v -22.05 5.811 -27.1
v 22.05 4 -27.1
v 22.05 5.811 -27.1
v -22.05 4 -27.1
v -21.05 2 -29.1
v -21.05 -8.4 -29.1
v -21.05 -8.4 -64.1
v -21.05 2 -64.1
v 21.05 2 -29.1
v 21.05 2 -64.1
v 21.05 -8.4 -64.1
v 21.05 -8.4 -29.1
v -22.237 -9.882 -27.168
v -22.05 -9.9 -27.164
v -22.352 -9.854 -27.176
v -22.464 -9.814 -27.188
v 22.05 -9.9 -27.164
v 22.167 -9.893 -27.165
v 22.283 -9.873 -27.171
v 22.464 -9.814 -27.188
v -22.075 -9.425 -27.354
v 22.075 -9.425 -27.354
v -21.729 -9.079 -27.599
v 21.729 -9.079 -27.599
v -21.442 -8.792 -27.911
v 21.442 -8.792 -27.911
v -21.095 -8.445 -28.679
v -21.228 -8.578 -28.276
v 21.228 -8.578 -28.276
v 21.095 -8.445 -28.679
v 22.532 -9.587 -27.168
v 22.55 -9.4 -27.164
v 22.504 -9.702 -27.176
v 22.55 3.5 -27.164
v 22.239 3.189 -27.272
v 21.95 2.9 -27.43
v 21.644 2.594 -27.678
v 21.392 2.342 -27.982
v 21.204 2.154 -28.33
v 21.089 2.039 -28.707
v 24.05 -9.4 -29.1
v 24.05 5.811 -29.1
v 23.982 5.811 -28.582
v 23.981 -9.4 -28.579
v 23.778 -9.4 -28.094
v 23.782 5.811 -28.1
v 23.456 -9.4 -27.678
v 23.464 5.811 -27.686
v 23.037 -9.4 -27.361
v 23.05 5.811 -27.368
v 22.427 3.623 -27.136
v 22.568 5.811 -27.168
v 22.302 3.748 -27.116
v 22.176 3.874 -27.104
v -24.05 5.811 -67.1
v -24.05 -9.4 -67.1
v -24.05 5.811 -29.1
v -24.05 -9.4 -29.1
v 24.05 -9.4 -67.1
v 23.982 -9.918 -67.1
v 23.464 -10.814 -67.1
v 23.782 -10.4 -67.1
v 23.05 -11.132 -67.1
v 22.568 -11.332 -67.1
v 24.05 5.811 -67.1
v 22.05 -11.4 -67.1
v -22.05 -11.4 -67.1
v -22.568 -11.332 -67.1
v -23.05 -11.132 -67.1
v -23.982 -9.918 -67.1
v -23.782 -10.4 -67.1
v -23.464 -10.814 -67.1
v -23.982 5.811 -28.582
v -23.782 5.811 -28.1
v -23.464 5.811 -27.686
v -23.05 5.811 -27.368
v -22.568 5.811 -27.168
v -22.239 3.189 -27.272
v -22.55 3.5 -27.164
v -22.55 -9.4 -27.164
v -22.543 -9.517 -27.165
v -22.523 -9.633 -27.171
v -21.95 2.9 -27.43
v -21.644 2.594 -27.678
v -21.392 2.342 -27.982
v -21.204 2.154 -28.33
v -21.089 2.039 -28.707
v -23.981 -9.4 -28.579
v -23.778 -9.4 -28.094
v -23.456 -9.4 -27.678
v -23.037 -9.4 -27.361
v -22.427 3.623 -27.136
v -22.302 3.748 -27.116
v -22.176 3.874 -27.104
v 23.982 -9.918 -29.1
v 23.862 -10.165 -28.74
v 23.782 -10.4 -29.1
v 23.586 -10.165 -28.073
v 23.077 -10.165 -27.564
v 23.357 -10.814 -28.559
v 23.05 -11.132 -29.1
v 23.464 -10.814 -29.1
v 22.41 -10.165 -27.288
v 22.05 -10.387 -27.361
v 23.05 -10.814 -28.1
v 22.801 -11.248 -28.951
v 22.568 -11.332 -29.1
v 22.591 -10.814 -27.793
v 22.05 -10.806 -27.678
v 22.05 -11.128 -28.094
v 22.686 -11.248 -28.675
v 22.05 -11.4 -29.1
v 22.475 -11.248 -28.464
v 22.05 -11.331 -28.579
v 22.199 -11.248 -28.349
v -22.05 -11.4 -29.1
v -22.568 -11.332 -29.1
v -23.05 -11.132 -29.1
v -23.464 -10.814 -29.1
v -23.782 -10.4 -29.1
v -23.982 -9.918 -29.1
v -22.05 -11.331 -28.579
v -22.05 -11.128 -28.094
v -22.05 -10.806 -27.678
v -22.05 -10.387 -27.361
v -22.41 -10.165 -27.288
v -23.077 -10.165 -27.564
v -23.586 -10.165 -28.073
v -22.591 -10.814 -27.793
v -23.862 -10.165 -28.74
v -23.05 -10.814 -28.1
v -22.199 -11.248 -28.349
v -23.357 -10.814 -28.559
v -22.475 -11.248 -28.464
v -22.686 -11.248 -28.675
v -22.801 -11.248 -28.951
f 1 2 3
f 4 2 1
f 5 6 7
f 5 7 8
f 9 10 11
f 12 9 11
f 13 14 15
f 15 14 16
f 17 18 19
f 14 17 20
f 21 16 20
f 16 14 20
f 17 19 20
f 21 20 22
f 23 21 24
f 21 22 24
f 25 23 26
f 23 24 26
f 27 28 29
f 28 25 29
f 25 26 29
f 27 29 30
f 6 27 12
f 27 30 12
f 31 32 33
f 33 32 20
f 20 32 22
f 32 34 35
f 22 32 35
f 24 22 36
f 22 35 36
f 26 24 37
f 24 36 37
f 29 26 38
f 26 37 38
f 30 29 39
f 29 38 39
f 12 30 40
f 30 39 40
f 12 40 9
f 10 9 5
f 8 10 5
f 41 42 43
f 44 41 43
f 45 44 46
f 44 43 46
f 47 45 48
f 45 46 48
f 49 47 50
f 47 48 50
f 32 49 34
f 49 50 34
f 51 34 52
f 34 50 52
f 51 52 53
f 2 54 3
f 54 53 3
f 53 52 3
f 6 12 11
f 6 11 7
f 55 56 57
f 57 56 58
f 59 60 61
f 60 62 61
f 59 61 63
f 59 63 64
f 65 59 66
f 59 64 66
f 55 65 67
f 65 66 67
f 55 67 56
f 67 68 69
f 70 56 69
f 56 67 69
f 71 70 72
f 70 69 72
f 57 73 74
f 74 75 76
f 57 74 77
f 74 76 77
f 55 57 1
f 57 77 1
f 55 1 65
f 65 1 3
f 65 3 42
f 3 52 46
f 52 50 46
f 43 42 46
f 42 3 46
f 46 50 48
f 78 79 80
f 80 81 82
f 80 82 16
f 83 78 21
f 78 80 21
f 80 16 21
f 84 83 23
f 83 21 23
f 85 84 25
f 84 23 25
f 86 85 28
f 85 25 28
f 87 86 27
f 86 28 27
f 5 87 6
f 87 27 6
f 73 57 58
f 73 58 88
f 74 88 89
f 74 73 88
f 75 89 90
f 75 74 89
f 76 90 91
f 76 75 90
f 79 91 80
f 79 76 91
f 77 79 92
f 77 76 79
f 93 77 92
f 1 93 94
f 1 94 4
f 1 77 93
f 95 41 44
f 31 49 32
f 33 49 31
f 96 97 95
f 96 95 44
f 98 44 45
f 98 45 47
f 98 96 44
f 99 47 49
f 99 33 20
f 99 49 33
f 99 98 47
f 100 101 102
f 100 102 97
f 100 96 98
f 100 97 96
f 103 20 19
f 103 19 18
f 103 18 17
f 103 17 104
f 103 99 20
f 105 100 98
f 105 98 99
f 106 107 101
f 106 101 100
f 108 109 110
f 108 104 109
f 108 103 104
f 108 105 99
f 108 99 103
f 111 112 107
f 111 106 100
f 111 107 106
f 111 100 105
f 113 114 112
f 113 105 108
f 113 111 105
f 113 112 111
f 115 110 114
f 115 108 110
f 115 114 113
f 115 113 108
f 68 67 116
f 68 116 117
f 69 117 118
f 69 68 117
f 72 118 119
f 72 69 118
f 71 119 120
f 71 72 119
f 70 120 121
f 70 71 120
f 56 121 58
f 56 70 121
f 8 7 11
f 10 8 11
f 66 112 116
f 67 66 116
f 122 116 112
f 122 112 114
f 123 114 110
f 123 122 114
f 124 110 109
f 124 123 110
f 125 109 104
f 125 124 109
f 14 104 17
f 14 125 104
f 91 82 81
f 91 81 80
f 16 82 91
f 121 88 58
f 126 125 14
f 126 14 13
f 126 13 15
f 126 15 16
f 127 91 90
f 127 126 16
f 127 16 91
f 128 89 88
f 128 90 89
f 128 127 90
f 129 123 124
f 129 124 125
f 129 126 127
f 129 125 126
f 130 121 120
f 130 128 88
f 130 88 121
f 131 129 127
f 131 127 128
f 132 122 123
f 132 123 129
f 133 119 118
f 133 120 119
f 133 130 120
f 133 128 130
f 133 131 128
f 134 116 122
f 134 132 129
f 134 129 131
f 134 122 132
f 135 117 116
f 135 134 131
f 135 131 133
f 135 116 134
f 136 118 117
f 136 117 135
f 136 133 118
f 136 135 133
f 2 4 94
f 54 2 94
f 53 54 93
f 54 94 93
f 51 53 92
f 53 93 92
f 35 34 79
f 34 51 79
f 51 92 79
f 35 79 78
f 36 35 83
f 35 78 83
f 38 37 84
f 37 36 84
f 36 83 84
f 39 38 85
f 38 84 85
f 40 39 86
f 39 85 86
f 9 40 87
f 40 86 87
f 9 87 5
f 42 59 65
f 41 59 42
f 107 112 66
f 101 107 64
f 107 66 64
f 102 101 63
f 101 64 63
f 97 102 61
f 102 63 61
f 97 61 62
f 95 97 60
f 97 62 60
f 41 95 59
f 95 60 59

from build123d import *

# Parameters (mm, degrees)
F1_DEPTH      = 6.4
F2_R          = 6.4
F3_DEPTH      = 0.5
F5_DEPTH      = 35
F5_DEPTH_BACK = 5
F6_T          = -3
F7_W          = 48.1
F7_H          = 40
F8_DEPTH      = 10
F9_T1_DEPTH   = 22.4
F9_T3_DEPTH   = 44.1
F9_T5_DEPTH   = 10.4
F9_T7_DEPTH   = 42.1
F9_T9_DEPTH   = 43
F9_S13_W      = 2
F9_S13_H      = 2
F9_T14_DEPTH  = 2
F9_S19_W      = 2
F9_S19_H      = 2
F9_T20_DEPTH  = 2
F9_S25_W      = 2
F9_S25_H      = 2
F9_T26_DEPTH  = 2
F9_S31_W      = 2
F9_S31_H      = 2
F9_T32_DEPTH  = 2
F9_T39_DEPTH  = 15.4
F9_T43_DEPTH  = 47.1
F9_T50_DEPTH  = 15.4
F9_T54_DEPTH  = 47.1
F9_T61_DEPTH  = 47.1
F9_T65_DEPTH  = 15.4
F9_T72_DEPTH  = 15.4
F9_T76_DEPTH  = 47.1
F11_W         = 65.6272098422
F11_H         = 14.6678336896
F12_DEPTH     = 40.001


# Not quite as in the source:
# - a fillet or chamfer that OpenCascade refuses, or shapes differently, is made with other operations: its cross-section is extruded or revolved along the edge and cut away or added


with BuildPart() as f1:
    # F0 (on Front) → F1 (new body)
    with BuildSketch(Plane.XZ):
        with BuildLine():
            ThreePointArc((19.05, 57.1), (17.5855339059, 60.6355339059), (14.05, 62.1))
            Line((14.05, 62.1), (-14.05, 62.1))
            ThreePointArc((-14.05, 62.1), (-17.5855339059, 60.6355339059), (-19.05, 57.1))
            Line((-19.05, 57.1), (-19.05, -57.1))
            ThreePointArc((-19.05, -57.1), (-17.5855339059, -60.6355339059), (-14.05, -62.1))
            Line((-14.05, -62.1), (14.05, -62.1))
            ThreePointArc((14.05, -62.1), (17.5855339059, -60.6355339059), (19.05, -57.1))
            Line((19.05, -57.1), (19.05, 57.1))
        make_face()
    extrude(amount=F1_DEPTH)

    # F2 (on face) → F3 (join)
    with BuildSketch(Plane.XZ.offset(6.4)):
        with BuildLine():
            ThreePointArc((1.6, 0), (8, -6.4), (14.4, 0))
            ThreePointArc((14.4, 0), (8, 6.4), (1.6, 0))
        make_face()
        with BuildLine():
            Line((14.4, -16.1), (14.4, 0))
            ThreePointArc((14.4, 0), (8, -6.4), (1.6, 0))
            Line((1.6, 0), (1.6, -16.1))
            ThreePointArc((1.6, -16.1), (8, -9.7), (14.4, -16.1))
        make_face()
        with BuildLine():
            ThreePointArc((1.6, -16.1), (8, -22.5), (14.4, -16.1))
            ThreePointArc((14.4, -16.1), (8, -9.7), (1.6, -16.1))
        make_face()
        with Locations((8, 16.1)):
            Circle(F2_R)
        with Locations((-8, 16.1)):
            Circle(F2_R)
        with Locations((-8, 0)):
            Circle(F2_R)
        with Locations((-8, -16.1)):
            Circle(F2_R)
    extrude(amount=F3_DEPTH)


with BuildPart() as f5:
    # F4 (on face) → F5 (new body, two sides)
    with BuildSketch(Plane(origin=(0, 0, -62.1), x_dir=(1, 0, 0), z_dir=(0, 0, -1))) as f5_sk:
        Polygon((-14.05, 11.4), (-24.05, 11.4), (-24.05, -5), (-14.05, -5), (14.05, -5), (24.05, -5), (24.05, 11.4), (14.05, 11.4), align=None)
    extrude(amount=-F5_DEPTH)
    extrude(f5_sk.sketch, amount=F5_DEPTH_BACK)

    # F6
    f6_openings = [f5.faces().sort_by_distance(p)[0] for p in [
        (0, -3.2, -27.1),
    ]]
    offset(amount=F6_T, openings=f6_openings)

    # F7 (on face) → F8 (join)
    with BuildSketch(Plane(origin=(0, 5, 0), x_dir=(-1, 0, 0), z_dir=(0, 1, 0))):
        with Locations((0, -47.1)):
            Rectangle(F7_W, F7_H)
    extrude(amount=F8_DEPTH)

    # F9: fillet of radius 2 on 12 edges, made by hand

    # F9_s2 → F9_t1 (cut)
    with BuildSketch(Plane.XZ.offset(-13)):
        with BuildLine():
            ThreePointArc((-24.05, -29.1), (-23.4642135624, -27.6857864376), (-22.05, -27.1))
            Line((-22.05, -27.1), (-24.05, -27.1))
            Line((-24.05, -27.1), (-24.05, -29.1))
        make_face()
        with BuildLine():
            ThreePointArc((24.05, -29.1), (23.4642135624, -27.6857864376), (22.05, -27.1))
            Line((22.05, -27.1), (24.05, -27.1))
            Line((24.05, -27.1), (24.05, -29.1))
        make_face()
    extrude(amount=F9_T1_DEPTH, mode=Mode.SUBTRACT)

    # F9_s4 → F9_t3 (cut)
    with BuildSketch(Plane.YZ.offset(-22.05)):
        with BuildLine():
            ThreePointArc((15, -29.1), (14.4142135624, -27.6857864376), (13, -27.1))
            Line((13, -27.1), (15, -27.1))
            Line((15, -27.1), (15, -29.1))
        make_face()
        with BuildLine():
            ThreePointArc((-11.4, -29.1), (-10.8142135624, -27.6857864376), (-9.4, -27.1))
            Line((-9.4, -27.1), (-11.4, -27.1))
            Line((-11.4, -27.1), (-11.4, -29.1))
        make_face()
    extrude(amount=F9_T3_DEPTH, mode=Mode.SUBTRACT)

    # F9_s6 → F9_t5 (cut)
    with BuildSketch(Plane.XZ.offset(-2)):
        with BuildLine():
            ThreePointArc((-23.05, -27.1), (-21.6357864376, -27.6857864376), (-21.05, -29.1))
            Line((-21.05, -29.1), (-21.05, -27.1))
            Line((-21.05, -27.1), (-23.05, -27.1))
        make_face()
        with BuildLine():
            ThreePointArc((23.05, -27.1), (21.6357864376, -27.6857864376), (21.05, -29.1))
            Line((21.05, -29.1), (21.05, -27.1))
            Line((21.05, -27.1), (23.05, -27.1))
        make_face()
    extrude(amount=F9_T5_DEPTH, mode=Mode.SUBTRACT)

    # F9_s8 → F9_t7 (cut)
    with BuildSketch(Plane.YZ.offset(-21.05)):
        with BuildLine():
            ThreePointArc((-10.4, -27.1), (-8.9857864376, -27.6857864376), (-8.4, -29.1))
            Line((-8.4, -29.1), (-8.4, -27.1))
            Line((-8.4, -27.1), (-10.4, -27.1))
        make_face()
        with BuildLine():
            ThreePointArc((4, -27.1), (2.5857864376, -27.6857864376), (2, -29.1))
            Line((2, -29.1), (2, -27.1))
            Line((2, -27.1), (4, -27.1))
        make_face()
    extrude(amount=F9_T7_DEPTH, mode=Mode.SUBTRACT)

    # F9_s10 → F9_t9 (cut)
    with BuildSketch(Plane.XY.offset(-72.1)):
        with BuildLine():
            ThreePointArc((22.05, -11.4), (23.4642135624, -10.8142135624), (24.05, -9.4))
            Line((24.05, -9.4), (24.05, -11.4))
            Line((24.05, -11.4), (22.05, -11.4))
        make_face()
        with BuildLine():
            ThreePointArc((24.05, 13), (23.4642135624, 14.4142135624), (22.05, 15))
            Line((22.05, 15), (24.05, 15))
            Line((24.05, 15), (24.05, 13))
        make_face()
        with BuildLine():
            ThreePointArc((-22.05, 15), (-23.4642135624, 14.4142135624), (-24.05, 13))
            Line((-24.05, 13), (-24.05, 15))
            Line((-24.05, 15), (-22.05, 15))
        make_face()
        with BuildLine():
            ThreePointArc((-22.05, -11.4), (-23.4642135624, -10.8142135624), (-24.05, -9.4))
            Line((-24.05, -9.4), (-24.05, -11.4))
            Line((-24.05, -11.4), (-22.05, -11.4))
        make_face()
    extrude(amount=F9_T9_DEPTH, mode=Mode.SUBTRACT)


with BuildPart() as f9_tool12:
    # F9_s13 → F9_t14 (new body)
    with BuildSketch(Plane.XZ.offset(-13)):
        with Locations((-23.05, -28.1)):
            Rectangle(F9_S13_W, F9_S13_H)
    extrude(amount=-F9_T14_DEPTH)

    # F9_s15 → F9_t16 (revolve, cut)
    with BuildSketch(Plane(origin=(-22.05, 13, -29.1), x_dir=(0.7071067812, 0, -0.7071067812), z_dir=(0.7071067812, 0, 0.7071067812))):
        with BuildLine():
            ThreePointArc((0, -2), (2, 0), (0, 2))
            Line((0, 2), (0, -2))
        make_face()
    revolve(axis=Axis((-22.05, 13, -29.1), (0, 1, 0)), mode=Mode.SUBTRACT)


with BuildPart() as f5_1:
    add(f5.part)

    # F9_t11: cut F9_tool12
    add(f9_tool12.part, mode=Mode.SUBTRACT)


with BuildPart() as f9_tool18:
    # F9_s19 → F9_t20 (new body)
    with BuildSketch(Plane.XZ.offset(9.4)):
        with Locations((-23.05, -28.1)):
            Rectangle(F9_S19_W, F9_S19_H)
    extrude(amount=F9_T20_DEPTH)

    # F9_s21 → F9_t22 (revolve, cut)
    with BuildSketch(Plane(origin=(-22.05, -9.4, -29.1), x_dir=(0.7071067812, 0, -0.7071067812), z_dir=(-0.7071067812, 0, -0.7071067812))):
        with BuildLine():
            ThreePointArc((0, -2), (2, 0), (0, 2))
            Line((0, 2), (0, -2))
        make_face()
    revolve(axis=Axis((-22.05, -9.4, -29.1), (0, -1, 0)), mode=Mode.SUBTRACT)


with BuildPart() as f5_2:
    add(f5_1.part)

    # F9_t17: cut F9_tool18
    add(f9_tool18.part, mode=Mode.SUBTRACT)


with BuildPart() as f9_tool24:
    # F9_s25 → F9_t26 (new body)
    with BuildSketch(Plane.YZ.offset(22.05)):
        with Locations((14, -28.1)):
            Rectangle(F9_S25_W, F9_S25_H)
    extrude(amount=F9_T26_DEPTH)

    # F9_s27 → F9_t28 (revolve, cut)
    with BuildSketch(Plane(origin=(22.05, 13, -29.1), x_dir=(0, -0.7071067812, -0.7071067812), z_dir=(0, -0.7071067812, 0.7071067812))):
        with BuildLine():
            ThreePointArc((0, -2), (2, 0), (0, 2))
            Line((0, 2), (0, -2))
        make_face()
    revolve(axis=Axis((22.05, 13, -29.1), (1, 0, 0)), mode=Mode.SUBTRACT)


with BuildPart() as f5_3:
    add(f5_2.part)

    # F9_t23: cut F9_tool24
    add(f9_tool24.part, mode=Mode.SUBTRACT)


with BuildPart() as f9_tool30:
    # F9_s31 → F9_t32 (new body)
    with BuildSketch(Plane.XZ.offset(9.4)):
        with Locations((23.05, -28.1)):
            Rectangle(F9_S31_W, F9_S31_H)
    extrude(amount=F9_T32_DEPTH)

    # F9_s33 → F9_t34 (revolve, cut)
    with BuildSketch(Plane(origin=(22.05, -9.4, -29.1), x_dir=(-0.7071067812, 0, -0.7071067812), z_dir=(-0.7071067812, 0, 0.7071067812))):
        with BuildLine():
            ThreePointArc((0, -2), (2, 0), (0, 2))
            Line((0, 2), (0, -2))
        make_face()
    revolve(axis=Axis((22.05, -9.4, -29.1), (0, -1, 0)), mode=Mode.SUBTRACT)


with BuildPart() as f5_4:
    add(f5_3.part)

    # F9_t29: cut F9_tool30
    add(f9_tool30.part, mode=Mode.SUBTRACT)


with BuildPart() as f9_tool37:
    # F9_s38 → F9_t39 (new body)
    with BuildSketch(Plane.XZ.offset(13.4)):
        with BuildLine():
            ThreePointArc((-23.05, -27.1), (-21.6357864376, -27.6857864376), (-21.05, -29.1))
            Line((-21.05, -29.1), (-21.05, -27.1))
            Line((-21.05, -27.1), (-23.05, -27.1))
        make_face()
    extrude(amount=-F9_T39_DEPTH)

    split(bisect_by=Plane.XZ.offset(8.4), keep=Keep.TOP)


with BuildPart() as f9_tool41:
    # F9_s42 → F9_t43 (new body)
    with BuildSketch(Plane.YZ.offset(21.05)):
        with BuildLine():
            ThreePointArc((-10.4, -27.1), (-8.9857864376, -27.6857864376), (-8.4, -29.1))
            Line((-8.4, -29.1), (-8.4, -27.1))
            Line((-8.4, -27.1), (-10.4, -27.1))
        make_face()
    extrude(amount=-F9_T43_DEPTH)

    split(bisect_by=Plane.YZ.offset(-21.05), keep=Keep.BOTTOM)


with BuildPart() as f9_tool37_1:
    add(f9_tool37.part)

    # F9_t45: intersect F9_tool41
    add(f9_tool41.part, mode=Mode.INTERSECT)


with BuildPart() as f5_5:
    add(f5_4.part)

    # F9_t35: cut F9_tool37
    add(f9_tool37_1.part, mode=Mode.SUBTRACT)


with BuildPart() as f9_tool48:
    # F9_s49 → F9_t50 (new body)
    with BuildSketch(Plane.XZ.offset(8.4)):
        with BuildLine():
            ThreePointArc((-23.05, -27.1), (-21.6357864376, -27.6857864376), (-21.05, -29.1))
            Line((-21.05, -29.1), (-21.05, -27.1))
            Line((-21.05, -27.1), (-23.05, -27.1))
        make_face()
    extrude(amount=-F9_T50_DEPTH)

    split(bisect_by=Plane.XZ.offset(-2), keep=Keep.BOTTOM)


with BuildPart() as f9_tool52:
    # F9_s53 → F9_t54 (new body)
    with BuildSketch(Plane.YZ.offset(-26.05)):
        with BuildLine():
            ThreePointArc((4, -27.1), (2.5857864376, -27.6857864376), (2, -29.1))
            Line((2, -29.1), (2, -27.1))
            Line((2, -27.1), (4, -27.1))
        make_face()
    extrude(amount=F9_T54_DEPTH)

    split(bisect_by=Plane.YZ.offset(-21.05), keep=Keep.BOTTOM)


with BuildPart() as f9_tool48_1:
    add(f9_tool48.part)

    # F9_t56: intersect F9_tool52
    add(f9_tool52.part, mode=Mode.INTERSECT)


with BuildPart() as f5_6:
    add(f5_5.part)

    # F9_t46: cut F9_tool48
    add(f9_tool48_1.part, mode=Mode.SUBTRACT)


with BuildPart() as f9_tool59:
    # F9_s60 → F9_t61 (new body)
    with BuildSketch(Plane.YZ.offset(26.05)):
        with BuildLine():
            ThreePointArc((-10.4, -27.1), (-8.9857864376, -27.6857864376), (-8.4, -29.1))
            Line((-8.4, -29.1), (-8.4, -27.1))
            Line((-8.4, -27.1), (-10.4, -27.1))
        make_face()
    extrude(amount=-F9_T61_DEPTH)

    split(bisect_by=Plane.YZ.offset(21.05), keep=Keep.TOP)


with BuildPart() as f9_tool63:
    # F9_s64 → F9_t65 (new body)
    with BuildSketch(Plane.XZ.offset(-2)):
        with BuildLine():
            ThreePointArc((23.05, -27.1), (21.6357864376, -27.6857864376), (21.05, -29.1))
            Line((21.05, -29.1), (21.05, -27.1))
            Line((21.05, -27.1), (23.05, -27.1))
        make_face()
    extrude(amount=F9_T65_DEPTH)

    split(bisect_by=Plane.XZ.offset(8.4), keep=Keep.TOP)


with BuildPart() as f9_tool59_1:
    add(f9_tool59.part)

    # F9_t67: intersect F9_tool63
    add(f9_tool63.part, mode=Mode.INTERSECT)


with BuildPart() as f5_7:
    add(f5_6.part)

    # F9_t57: cut F9_tool59
    add(f9_tool59_1.part, mode=Mode.SUBTRACT)


with BuildPart() as f9_tool70:
    # F9_s71 → F9_t72 (new body)
    with BuildSketch(Plane.XZ.offset(-7)):
        with BuildLine():
            ThreePointArc((23.05, -27.1), (21.6357864376, -27.6857864376), (21.05, -29.1))
            Line((21.05, -29.1), (21.05, -27.1))
            Line((21.05, -27.1), (23.05, -27.1))
        make_face()
    extrude(amount=F9_T72_DEPTH)

    split(bisect_by=Plane.XZ.offset(-2), keep=Keep.BOTTOM)


with BuildPart() as f9_tool74:
    # F9_s75 → F9_t76 (new body)
    with BuildSketch(Plane.YZ.offset(-21.05)):
        with BuildLine():
            ThreePointArc((4, -27.1), (2.5857864376, -27.6857864376), (2, -29.1))
            Line((2, -29.1), (2, -27.1))
            Line((2, -27.1), (4, -27.1))
        make_face()
    extrude(amount=F9_T76_DEPTH)

    split(bisect_by=Plane.YZ.offset(21.05), keep=Keep.TOP)


with BuildPart() as f9_tool70_1:
    add(f9_tool70.part)

    # F9_t78: intersect F9_tool74
    add(f9_tool74.part, mode=Mode.INTERSECT)


with BuildPart() as f5_8:
    add(f5_7.part)

    # F9_t68: cut F9_tool70
    add(f9_tool70_1.part, mode=Mode.SUBTRACT)

    # F11 (on face) → F12 (cut, through all)
    with BuildSketch(Plane.XY.offset(-27.1)):
        with Locations((-0.3663264215, 13.1452779751)):
            Rectangle(F11_W, F11_H)
    extrude(amount=-F12_DEPTH, mode=Mode.SUBTRACT)


solid = f5_8.part
